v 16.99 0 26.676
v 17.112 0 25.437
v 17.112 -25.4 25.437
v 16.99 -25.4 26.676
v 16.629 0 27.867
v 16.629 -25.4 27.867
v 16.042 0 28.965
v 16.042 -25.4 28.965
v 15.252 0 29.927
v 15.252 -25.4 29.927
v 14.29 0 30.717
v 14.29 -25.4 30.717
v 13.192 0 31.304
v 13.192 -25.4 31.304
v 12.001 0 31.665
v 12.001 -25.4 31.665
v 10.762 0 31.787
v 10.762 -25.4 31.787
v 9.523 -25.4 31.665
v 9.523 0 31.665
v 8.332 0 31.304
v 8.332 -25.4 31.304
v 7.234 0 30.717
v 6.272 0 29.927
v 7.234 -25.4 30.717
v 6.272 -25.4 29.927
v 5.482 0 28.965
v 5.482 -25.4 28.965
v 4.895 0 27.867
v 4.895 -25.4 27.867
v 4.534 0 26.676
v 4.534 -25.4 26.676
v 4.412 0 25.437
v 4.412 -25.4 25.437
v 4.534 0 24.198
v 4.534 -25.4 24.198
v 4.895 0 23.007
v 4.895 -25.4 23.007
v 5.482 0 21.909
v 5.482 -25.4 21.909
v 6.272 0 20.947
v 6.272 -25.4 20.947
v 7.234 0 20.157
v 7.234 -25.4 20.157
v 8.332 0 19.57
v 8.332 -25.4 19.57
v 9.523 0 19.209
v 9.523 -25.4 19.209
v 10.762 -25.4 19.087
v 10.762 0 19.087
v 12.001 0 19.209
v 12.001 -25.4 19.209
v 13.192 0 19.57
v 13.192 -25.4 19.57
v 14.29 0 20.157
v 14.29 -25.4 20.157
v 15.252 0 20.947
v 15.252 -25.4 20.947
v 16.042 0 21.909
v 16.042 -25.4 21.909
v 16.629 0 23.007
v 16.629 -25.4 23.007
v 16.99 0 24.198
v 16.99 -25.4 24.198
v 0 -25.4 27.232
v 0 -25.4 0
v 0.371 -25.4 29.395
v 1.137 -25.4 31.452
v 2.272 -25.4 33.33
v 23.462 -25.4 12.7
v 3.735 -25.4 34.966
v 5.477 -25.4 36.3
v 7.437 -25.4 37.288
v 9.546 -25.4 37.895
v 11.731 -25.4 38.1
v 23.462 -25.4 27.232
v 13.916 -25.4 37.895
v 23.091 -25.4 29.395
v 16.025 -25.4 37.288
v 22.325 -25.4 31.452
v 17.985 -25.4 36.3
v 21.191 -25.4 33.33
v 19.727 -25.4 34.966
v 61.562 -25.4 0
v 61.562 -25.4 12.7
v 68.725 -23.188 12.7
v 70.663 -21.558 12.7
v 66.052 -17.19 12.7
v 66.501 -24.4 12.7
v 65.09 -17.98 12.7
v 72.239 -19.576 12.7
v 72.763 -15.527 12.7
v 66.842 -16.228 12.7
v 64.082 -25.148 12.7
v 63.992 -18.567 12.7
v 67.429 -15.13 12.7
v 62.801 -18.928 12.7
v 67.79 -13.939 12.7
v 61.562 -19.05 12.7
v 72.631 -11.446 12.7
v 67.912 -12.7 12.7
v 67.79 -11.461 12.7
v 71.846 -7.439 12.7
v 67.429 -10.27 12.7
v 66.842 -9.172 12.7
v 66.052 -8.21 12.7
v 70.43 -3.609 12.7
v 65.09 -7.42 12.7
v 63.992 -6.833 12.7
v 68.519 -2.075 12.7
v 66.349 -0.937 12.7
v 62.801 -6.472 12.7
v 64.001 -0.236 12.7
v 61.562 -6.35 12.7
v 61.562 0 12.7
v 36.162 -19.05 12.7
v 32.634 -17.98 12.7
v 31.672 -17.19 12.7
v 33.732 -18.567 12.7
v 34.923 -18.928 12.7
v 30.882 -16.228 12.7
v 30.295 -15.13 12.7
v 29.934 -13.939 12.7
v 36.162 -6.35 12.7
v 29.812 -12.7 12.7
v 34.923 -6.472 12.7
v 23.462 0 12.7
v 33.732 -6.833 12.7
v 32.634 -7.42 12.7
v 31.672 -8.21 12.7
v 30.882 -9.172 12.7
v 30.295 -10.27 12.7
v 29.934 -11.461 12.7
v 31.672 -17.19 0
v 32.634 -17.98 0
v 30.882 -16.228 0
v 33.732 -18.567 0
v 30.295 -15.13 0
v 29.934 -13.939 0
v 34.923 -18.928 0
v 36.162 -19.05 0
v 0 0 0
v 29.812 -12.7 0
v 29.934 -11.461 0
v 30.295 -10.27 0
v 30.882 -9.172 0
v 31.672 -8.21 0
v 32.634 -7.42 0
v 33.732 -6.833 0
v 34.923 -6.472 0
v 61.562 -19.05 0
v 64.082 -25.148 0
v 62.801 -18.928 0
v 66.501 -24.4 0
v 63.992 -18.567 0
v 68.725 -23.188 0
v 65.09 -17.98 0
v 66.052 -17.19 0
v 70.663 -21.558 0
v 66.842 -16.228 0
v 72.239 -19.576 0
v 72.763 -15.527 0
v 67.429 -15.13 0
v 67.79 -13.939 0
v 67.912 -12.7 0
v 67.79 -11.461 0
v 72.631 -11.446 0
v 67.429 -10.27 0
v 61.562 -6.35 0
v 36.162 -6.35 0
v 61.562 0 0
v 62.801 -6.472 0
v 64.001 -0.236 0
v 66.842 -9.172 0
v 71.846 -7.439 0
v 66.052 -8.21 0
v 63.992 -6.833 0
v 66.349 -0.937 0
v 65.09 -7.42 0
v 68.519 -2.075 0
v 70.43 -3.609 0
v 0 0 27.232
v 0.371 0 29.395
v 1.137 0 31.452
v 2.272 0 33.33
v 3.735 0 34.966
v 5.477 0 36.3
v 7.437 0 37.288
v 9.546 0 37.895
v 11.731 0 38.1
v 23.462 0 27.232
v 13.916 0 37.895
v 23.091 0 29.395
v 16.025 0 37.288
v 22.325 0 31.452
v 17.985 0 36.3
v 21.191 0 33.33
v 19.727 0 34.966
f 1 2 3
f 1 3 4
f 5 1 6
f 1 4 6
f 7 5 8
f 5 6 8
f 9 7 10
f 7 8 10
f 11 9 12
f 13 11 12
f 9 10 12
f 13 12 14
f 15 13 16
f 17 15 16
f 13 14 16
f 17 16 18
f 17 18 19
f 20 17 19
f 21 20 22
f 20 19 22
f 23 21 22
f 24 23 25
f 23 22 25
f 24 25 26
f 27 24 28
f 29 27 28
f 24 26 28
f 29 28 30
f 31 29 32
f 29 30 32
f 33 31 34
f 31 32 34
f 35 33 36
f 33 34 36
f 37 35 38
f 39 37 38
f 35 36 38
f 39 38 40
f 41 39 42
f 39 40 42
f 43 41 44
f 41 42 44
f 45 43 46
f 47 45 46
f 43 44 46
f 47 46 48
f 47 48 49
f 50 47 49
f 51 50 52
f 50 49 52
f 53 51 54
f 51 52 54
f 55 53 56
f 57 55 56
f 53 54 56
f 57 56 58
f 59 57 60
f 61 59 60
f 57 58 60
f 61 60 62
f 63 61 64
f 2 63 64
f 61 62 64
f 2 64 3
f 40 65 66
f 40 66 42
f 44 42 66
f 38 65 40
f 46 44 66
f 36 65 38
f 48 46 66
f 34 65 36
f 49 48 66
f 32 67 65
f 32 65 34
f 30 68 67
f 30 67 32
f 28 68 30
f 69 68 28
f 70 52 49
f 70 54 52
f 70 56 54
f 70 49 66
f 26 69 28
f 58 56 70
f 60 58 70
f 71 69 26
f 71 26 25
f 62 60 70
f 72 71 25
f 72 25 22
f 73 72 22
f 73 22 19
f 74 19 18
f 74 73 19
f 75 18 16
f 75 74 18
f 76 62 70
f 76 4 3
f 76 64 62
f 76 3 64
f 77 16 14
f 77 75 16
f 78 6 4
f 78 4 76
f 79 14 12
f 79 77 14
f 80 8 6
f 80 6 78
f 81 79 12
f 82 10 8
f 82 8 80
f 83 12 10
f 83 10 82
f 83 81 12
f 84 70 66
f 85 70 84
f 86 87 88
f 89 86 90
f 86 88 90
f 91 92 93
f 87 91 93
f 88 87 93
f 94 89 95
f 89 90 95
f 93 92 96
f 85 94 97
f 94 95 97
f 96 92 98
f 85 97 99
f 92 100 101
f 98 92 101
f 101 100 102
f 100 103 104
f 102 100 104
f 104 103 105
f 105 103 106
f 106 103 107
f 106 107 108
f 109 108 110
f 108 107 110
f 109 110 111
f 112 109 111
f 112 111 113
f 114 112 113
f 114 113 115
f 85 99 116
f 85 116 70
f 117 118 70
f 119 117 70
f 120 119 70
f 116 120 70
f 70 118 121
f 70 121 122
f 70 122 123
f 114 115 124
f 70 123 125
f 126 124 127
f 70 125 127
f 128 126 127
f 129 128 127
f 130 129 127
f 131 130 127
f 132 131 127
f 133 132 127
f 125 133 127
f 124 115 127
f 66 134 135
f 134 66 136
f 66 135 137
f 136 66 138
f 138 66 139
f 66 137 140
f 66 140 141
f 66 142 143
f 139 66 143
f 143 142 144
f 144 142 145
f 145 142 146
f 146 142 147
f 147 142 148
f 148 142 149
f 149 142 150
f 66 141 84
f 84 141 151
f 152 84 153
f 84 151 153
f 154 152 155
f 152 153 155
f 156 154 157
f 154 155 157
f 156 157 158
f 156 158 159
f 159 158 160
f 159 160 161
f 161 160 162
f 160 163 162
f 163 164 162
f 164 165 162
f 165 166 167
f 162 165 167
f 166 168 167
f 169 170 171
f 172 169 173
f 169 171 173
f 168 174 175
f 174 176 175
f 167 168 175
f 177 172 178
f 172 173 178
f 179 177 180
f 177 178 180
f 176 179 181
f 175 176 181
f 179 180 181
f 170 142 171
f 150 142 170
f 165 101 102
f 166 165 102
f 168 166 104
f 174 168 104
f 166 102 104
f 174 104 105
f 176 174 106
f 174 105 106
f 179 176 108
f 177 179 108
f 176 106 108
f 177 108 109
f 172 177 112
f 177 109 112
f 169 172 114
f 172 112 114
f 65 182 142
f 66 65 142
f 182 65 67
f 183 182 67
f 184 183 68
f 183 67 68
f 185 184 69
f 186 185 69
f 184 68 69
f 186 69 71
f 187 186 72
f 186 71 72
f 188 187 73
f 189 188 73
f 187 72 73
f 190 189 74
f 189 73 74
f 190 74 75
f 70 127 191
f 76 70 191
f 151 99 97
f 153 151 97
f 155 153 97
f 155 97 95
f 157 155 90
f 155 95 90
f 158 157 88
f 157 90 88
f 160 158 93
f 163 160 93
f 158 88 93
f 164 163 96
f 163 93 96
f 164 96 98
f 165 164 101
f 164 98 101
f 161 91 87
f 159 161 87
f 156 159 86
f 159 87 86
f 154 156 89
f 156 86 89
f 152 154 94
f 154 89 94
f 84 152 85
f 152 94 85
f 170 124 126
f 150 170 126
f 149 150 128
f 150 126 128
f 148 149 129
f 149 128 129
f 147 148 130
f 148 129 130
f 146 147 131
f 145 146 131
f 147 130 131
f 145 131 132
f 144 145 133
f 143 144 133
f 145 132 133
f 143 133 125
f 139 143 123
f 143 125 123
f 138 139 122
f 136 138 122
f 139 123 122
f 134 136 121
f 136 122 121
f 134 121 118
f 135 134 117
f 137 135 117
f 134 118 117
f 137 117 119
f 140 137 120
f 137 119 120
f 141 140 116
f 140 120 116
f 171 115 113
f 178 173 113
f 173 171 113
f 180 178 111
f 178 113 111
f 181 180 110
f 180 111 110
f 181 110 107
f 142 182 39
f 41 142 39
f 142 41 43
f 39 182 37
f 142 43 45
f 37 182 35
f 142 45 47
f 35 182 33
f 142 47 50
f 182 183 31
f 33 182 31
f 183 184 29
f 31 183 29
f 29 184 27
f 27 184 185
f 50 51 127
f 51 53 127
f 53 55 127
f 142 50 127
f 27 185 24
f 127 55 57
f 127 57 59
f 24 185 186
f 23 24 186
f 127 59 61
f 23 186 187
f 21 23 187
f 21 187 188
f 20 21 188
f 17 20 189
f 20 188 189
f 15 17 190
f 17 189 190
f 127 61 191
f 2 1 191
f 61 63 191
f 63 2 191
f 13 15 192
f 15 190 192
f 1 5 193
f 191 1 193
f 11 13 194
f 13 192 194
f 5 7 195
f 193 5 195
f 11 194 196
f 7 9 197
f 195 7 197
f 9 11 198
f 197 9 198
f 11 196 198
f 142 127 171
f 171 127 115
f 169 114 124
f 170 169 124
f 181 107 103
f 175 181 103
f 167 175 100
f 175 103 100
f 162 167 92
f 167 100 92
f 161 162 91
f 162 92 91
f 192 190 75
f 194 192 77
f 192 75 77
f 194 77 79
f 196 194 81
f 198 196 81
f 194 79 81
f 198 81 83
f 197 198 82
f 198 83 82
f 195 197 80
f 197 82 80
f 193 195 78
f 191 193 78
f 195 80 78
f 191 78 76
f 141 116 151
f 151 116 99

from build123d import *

# Parameters (mm, degrees)
F1_DEPTH = 25.4
F2_R     = 6.35
F3_DEPTH = 25.4
F5_DEPTH = 25.4
F7_DEPTH = 25.4


with BuildPart() as f1:
    # F0 (on Front) → F1 (new body)
    with BuildSketch(Plane.XZ):
        Polygon((0, 38.1), (0, 0), (76.2, 0), (76.2, 12.7), (23.4621260909, 12.7), (23.4621260909, 38.1), align=None)
    extrude(amount=F1_DEPTH)

    # F2 (on face) → F3 (cut)
    with BuildSketch(Plane.XZ.offset(25.4)):
        with BuildLine():
            ThreePointArc((11.7310630454, 38.1), (19.7267698627, 34.9655343316), (23.4621260909, 27.2322739337))
            Line((23.4621260909, 27.2322739337), (23.4621260909, 38.1))
            Line((23.4621260909, 38.1), (11.7310630454, 38.1))
        make_face()
        with BuildLine():
            ThreePointArc((0, 27.2322739337), (3.7353562282, 34.9655343316), (11.7310630454, 38.1))
            Line((11.7310630454, 38.1), (0, 38.1))
            Line((0, 38.1), (0, 27.2322739337))
        make_face()
        with Locations((10.7621260909, 25.4370161029)):
            Circle(F2_R)
    extrude(amount=-F3_DEPTH, mode=Mode.SUBTRACT)

    # F4 (on face) → F5 (cut)
    with BuildSketch(Plane.XY.offset(12.7)):
        with BuildLine():
            ThreePointArc((67.9121260909, -12.7), (66.0522541514, -8.2098719395), (61.5621260909, -6.35))
            Line((61.5621260909, -6.35), (61.5621260909, -19.05))
            ThreePointArc((61.5621260909, -19.05), (66.0522541514, -17.1901280605), (67.9121260909, -12.7))
        make_face()
        with BuildLine():
            ThreePointArc((42.5121260909, -12.7), (40.6522541514, -8.2098719395), (36.1621260909, -6.35))
            Line((36.1621260909, -6.35), (36.1621260909, -19.05))
            ThreePointArc((36.1621260909, -19.05), (40.6522541514, -17.1901280605), (42.5121260909, -12.7))
        make_face()
        with BuildLine():
            Line((61.5621260909, -19.05), (61.5621260909, -6.35))
            ThreePointArc((61.5621260909, -6.35), (55.2121260909, -12.7), (61.5621260909, -19.05))
        make_face()
        with BuildLine():
            Line((61.5621260909, -6.35), (36.1621260909, -6.35))
            ThreePointArc((36.1621260909, -6.35), (40.6522541514, -8.2098719395), (42.5121260909, -12.7))
            ThreePointArc((42.5121260909, -12.7), (40.6522541514, -17.1901280605), (36.1621260909, -19.05))
            Line((36.1621260909, -19.05), (61.5621260909, -19.05))
            ThreePointArc((61.5621260909, -19.05), (55.2121260909, -12.7), (61.5621260909, -6.35))
        make_face()
        with BuildLine():
            Line((36.1621260909, -19.05), (36.1621260909, -6.35))
            ThreePointArc((36.1621260909, -6.35), (29.8121260909, -12.7), (36.1621260909, -19.05))
        make_face()
        with BuildLine():
            ThreePointArc((61.5621260909, 0), (74.2621260909, -12.7), (61.5621260909, -25.4))
            Line((61.5621260909, -25.4), (76.2, -25.4))
            Line((76.2, -25.4), (76.2, 0))
            Line((76.2, 0), (61.5621260909, 0))
        make_face()
    extrude(amount=-F5_DEPTH, mode=Mode.SUBTRACT)

    # F6 (on face) → F7 (cut)
    with BuildSketch(Plane.XY.offset(12.7)):
        with BuildLine():
            ThreePointArc((70.4301233526, -3.6088711061), (72.6308384047, -11.4457312958), (72.2394995097, -19.5763141925))
            ThreePointArc((72.2394995097, -19.5763141925), (74.1813649126, -11.2700309235), (70.4301233526, -3.6088711061))
        make_face()
    extrude(amount=-F7_DEPTH, mode=Mode.SUBTRACT)


solid = f1.part
